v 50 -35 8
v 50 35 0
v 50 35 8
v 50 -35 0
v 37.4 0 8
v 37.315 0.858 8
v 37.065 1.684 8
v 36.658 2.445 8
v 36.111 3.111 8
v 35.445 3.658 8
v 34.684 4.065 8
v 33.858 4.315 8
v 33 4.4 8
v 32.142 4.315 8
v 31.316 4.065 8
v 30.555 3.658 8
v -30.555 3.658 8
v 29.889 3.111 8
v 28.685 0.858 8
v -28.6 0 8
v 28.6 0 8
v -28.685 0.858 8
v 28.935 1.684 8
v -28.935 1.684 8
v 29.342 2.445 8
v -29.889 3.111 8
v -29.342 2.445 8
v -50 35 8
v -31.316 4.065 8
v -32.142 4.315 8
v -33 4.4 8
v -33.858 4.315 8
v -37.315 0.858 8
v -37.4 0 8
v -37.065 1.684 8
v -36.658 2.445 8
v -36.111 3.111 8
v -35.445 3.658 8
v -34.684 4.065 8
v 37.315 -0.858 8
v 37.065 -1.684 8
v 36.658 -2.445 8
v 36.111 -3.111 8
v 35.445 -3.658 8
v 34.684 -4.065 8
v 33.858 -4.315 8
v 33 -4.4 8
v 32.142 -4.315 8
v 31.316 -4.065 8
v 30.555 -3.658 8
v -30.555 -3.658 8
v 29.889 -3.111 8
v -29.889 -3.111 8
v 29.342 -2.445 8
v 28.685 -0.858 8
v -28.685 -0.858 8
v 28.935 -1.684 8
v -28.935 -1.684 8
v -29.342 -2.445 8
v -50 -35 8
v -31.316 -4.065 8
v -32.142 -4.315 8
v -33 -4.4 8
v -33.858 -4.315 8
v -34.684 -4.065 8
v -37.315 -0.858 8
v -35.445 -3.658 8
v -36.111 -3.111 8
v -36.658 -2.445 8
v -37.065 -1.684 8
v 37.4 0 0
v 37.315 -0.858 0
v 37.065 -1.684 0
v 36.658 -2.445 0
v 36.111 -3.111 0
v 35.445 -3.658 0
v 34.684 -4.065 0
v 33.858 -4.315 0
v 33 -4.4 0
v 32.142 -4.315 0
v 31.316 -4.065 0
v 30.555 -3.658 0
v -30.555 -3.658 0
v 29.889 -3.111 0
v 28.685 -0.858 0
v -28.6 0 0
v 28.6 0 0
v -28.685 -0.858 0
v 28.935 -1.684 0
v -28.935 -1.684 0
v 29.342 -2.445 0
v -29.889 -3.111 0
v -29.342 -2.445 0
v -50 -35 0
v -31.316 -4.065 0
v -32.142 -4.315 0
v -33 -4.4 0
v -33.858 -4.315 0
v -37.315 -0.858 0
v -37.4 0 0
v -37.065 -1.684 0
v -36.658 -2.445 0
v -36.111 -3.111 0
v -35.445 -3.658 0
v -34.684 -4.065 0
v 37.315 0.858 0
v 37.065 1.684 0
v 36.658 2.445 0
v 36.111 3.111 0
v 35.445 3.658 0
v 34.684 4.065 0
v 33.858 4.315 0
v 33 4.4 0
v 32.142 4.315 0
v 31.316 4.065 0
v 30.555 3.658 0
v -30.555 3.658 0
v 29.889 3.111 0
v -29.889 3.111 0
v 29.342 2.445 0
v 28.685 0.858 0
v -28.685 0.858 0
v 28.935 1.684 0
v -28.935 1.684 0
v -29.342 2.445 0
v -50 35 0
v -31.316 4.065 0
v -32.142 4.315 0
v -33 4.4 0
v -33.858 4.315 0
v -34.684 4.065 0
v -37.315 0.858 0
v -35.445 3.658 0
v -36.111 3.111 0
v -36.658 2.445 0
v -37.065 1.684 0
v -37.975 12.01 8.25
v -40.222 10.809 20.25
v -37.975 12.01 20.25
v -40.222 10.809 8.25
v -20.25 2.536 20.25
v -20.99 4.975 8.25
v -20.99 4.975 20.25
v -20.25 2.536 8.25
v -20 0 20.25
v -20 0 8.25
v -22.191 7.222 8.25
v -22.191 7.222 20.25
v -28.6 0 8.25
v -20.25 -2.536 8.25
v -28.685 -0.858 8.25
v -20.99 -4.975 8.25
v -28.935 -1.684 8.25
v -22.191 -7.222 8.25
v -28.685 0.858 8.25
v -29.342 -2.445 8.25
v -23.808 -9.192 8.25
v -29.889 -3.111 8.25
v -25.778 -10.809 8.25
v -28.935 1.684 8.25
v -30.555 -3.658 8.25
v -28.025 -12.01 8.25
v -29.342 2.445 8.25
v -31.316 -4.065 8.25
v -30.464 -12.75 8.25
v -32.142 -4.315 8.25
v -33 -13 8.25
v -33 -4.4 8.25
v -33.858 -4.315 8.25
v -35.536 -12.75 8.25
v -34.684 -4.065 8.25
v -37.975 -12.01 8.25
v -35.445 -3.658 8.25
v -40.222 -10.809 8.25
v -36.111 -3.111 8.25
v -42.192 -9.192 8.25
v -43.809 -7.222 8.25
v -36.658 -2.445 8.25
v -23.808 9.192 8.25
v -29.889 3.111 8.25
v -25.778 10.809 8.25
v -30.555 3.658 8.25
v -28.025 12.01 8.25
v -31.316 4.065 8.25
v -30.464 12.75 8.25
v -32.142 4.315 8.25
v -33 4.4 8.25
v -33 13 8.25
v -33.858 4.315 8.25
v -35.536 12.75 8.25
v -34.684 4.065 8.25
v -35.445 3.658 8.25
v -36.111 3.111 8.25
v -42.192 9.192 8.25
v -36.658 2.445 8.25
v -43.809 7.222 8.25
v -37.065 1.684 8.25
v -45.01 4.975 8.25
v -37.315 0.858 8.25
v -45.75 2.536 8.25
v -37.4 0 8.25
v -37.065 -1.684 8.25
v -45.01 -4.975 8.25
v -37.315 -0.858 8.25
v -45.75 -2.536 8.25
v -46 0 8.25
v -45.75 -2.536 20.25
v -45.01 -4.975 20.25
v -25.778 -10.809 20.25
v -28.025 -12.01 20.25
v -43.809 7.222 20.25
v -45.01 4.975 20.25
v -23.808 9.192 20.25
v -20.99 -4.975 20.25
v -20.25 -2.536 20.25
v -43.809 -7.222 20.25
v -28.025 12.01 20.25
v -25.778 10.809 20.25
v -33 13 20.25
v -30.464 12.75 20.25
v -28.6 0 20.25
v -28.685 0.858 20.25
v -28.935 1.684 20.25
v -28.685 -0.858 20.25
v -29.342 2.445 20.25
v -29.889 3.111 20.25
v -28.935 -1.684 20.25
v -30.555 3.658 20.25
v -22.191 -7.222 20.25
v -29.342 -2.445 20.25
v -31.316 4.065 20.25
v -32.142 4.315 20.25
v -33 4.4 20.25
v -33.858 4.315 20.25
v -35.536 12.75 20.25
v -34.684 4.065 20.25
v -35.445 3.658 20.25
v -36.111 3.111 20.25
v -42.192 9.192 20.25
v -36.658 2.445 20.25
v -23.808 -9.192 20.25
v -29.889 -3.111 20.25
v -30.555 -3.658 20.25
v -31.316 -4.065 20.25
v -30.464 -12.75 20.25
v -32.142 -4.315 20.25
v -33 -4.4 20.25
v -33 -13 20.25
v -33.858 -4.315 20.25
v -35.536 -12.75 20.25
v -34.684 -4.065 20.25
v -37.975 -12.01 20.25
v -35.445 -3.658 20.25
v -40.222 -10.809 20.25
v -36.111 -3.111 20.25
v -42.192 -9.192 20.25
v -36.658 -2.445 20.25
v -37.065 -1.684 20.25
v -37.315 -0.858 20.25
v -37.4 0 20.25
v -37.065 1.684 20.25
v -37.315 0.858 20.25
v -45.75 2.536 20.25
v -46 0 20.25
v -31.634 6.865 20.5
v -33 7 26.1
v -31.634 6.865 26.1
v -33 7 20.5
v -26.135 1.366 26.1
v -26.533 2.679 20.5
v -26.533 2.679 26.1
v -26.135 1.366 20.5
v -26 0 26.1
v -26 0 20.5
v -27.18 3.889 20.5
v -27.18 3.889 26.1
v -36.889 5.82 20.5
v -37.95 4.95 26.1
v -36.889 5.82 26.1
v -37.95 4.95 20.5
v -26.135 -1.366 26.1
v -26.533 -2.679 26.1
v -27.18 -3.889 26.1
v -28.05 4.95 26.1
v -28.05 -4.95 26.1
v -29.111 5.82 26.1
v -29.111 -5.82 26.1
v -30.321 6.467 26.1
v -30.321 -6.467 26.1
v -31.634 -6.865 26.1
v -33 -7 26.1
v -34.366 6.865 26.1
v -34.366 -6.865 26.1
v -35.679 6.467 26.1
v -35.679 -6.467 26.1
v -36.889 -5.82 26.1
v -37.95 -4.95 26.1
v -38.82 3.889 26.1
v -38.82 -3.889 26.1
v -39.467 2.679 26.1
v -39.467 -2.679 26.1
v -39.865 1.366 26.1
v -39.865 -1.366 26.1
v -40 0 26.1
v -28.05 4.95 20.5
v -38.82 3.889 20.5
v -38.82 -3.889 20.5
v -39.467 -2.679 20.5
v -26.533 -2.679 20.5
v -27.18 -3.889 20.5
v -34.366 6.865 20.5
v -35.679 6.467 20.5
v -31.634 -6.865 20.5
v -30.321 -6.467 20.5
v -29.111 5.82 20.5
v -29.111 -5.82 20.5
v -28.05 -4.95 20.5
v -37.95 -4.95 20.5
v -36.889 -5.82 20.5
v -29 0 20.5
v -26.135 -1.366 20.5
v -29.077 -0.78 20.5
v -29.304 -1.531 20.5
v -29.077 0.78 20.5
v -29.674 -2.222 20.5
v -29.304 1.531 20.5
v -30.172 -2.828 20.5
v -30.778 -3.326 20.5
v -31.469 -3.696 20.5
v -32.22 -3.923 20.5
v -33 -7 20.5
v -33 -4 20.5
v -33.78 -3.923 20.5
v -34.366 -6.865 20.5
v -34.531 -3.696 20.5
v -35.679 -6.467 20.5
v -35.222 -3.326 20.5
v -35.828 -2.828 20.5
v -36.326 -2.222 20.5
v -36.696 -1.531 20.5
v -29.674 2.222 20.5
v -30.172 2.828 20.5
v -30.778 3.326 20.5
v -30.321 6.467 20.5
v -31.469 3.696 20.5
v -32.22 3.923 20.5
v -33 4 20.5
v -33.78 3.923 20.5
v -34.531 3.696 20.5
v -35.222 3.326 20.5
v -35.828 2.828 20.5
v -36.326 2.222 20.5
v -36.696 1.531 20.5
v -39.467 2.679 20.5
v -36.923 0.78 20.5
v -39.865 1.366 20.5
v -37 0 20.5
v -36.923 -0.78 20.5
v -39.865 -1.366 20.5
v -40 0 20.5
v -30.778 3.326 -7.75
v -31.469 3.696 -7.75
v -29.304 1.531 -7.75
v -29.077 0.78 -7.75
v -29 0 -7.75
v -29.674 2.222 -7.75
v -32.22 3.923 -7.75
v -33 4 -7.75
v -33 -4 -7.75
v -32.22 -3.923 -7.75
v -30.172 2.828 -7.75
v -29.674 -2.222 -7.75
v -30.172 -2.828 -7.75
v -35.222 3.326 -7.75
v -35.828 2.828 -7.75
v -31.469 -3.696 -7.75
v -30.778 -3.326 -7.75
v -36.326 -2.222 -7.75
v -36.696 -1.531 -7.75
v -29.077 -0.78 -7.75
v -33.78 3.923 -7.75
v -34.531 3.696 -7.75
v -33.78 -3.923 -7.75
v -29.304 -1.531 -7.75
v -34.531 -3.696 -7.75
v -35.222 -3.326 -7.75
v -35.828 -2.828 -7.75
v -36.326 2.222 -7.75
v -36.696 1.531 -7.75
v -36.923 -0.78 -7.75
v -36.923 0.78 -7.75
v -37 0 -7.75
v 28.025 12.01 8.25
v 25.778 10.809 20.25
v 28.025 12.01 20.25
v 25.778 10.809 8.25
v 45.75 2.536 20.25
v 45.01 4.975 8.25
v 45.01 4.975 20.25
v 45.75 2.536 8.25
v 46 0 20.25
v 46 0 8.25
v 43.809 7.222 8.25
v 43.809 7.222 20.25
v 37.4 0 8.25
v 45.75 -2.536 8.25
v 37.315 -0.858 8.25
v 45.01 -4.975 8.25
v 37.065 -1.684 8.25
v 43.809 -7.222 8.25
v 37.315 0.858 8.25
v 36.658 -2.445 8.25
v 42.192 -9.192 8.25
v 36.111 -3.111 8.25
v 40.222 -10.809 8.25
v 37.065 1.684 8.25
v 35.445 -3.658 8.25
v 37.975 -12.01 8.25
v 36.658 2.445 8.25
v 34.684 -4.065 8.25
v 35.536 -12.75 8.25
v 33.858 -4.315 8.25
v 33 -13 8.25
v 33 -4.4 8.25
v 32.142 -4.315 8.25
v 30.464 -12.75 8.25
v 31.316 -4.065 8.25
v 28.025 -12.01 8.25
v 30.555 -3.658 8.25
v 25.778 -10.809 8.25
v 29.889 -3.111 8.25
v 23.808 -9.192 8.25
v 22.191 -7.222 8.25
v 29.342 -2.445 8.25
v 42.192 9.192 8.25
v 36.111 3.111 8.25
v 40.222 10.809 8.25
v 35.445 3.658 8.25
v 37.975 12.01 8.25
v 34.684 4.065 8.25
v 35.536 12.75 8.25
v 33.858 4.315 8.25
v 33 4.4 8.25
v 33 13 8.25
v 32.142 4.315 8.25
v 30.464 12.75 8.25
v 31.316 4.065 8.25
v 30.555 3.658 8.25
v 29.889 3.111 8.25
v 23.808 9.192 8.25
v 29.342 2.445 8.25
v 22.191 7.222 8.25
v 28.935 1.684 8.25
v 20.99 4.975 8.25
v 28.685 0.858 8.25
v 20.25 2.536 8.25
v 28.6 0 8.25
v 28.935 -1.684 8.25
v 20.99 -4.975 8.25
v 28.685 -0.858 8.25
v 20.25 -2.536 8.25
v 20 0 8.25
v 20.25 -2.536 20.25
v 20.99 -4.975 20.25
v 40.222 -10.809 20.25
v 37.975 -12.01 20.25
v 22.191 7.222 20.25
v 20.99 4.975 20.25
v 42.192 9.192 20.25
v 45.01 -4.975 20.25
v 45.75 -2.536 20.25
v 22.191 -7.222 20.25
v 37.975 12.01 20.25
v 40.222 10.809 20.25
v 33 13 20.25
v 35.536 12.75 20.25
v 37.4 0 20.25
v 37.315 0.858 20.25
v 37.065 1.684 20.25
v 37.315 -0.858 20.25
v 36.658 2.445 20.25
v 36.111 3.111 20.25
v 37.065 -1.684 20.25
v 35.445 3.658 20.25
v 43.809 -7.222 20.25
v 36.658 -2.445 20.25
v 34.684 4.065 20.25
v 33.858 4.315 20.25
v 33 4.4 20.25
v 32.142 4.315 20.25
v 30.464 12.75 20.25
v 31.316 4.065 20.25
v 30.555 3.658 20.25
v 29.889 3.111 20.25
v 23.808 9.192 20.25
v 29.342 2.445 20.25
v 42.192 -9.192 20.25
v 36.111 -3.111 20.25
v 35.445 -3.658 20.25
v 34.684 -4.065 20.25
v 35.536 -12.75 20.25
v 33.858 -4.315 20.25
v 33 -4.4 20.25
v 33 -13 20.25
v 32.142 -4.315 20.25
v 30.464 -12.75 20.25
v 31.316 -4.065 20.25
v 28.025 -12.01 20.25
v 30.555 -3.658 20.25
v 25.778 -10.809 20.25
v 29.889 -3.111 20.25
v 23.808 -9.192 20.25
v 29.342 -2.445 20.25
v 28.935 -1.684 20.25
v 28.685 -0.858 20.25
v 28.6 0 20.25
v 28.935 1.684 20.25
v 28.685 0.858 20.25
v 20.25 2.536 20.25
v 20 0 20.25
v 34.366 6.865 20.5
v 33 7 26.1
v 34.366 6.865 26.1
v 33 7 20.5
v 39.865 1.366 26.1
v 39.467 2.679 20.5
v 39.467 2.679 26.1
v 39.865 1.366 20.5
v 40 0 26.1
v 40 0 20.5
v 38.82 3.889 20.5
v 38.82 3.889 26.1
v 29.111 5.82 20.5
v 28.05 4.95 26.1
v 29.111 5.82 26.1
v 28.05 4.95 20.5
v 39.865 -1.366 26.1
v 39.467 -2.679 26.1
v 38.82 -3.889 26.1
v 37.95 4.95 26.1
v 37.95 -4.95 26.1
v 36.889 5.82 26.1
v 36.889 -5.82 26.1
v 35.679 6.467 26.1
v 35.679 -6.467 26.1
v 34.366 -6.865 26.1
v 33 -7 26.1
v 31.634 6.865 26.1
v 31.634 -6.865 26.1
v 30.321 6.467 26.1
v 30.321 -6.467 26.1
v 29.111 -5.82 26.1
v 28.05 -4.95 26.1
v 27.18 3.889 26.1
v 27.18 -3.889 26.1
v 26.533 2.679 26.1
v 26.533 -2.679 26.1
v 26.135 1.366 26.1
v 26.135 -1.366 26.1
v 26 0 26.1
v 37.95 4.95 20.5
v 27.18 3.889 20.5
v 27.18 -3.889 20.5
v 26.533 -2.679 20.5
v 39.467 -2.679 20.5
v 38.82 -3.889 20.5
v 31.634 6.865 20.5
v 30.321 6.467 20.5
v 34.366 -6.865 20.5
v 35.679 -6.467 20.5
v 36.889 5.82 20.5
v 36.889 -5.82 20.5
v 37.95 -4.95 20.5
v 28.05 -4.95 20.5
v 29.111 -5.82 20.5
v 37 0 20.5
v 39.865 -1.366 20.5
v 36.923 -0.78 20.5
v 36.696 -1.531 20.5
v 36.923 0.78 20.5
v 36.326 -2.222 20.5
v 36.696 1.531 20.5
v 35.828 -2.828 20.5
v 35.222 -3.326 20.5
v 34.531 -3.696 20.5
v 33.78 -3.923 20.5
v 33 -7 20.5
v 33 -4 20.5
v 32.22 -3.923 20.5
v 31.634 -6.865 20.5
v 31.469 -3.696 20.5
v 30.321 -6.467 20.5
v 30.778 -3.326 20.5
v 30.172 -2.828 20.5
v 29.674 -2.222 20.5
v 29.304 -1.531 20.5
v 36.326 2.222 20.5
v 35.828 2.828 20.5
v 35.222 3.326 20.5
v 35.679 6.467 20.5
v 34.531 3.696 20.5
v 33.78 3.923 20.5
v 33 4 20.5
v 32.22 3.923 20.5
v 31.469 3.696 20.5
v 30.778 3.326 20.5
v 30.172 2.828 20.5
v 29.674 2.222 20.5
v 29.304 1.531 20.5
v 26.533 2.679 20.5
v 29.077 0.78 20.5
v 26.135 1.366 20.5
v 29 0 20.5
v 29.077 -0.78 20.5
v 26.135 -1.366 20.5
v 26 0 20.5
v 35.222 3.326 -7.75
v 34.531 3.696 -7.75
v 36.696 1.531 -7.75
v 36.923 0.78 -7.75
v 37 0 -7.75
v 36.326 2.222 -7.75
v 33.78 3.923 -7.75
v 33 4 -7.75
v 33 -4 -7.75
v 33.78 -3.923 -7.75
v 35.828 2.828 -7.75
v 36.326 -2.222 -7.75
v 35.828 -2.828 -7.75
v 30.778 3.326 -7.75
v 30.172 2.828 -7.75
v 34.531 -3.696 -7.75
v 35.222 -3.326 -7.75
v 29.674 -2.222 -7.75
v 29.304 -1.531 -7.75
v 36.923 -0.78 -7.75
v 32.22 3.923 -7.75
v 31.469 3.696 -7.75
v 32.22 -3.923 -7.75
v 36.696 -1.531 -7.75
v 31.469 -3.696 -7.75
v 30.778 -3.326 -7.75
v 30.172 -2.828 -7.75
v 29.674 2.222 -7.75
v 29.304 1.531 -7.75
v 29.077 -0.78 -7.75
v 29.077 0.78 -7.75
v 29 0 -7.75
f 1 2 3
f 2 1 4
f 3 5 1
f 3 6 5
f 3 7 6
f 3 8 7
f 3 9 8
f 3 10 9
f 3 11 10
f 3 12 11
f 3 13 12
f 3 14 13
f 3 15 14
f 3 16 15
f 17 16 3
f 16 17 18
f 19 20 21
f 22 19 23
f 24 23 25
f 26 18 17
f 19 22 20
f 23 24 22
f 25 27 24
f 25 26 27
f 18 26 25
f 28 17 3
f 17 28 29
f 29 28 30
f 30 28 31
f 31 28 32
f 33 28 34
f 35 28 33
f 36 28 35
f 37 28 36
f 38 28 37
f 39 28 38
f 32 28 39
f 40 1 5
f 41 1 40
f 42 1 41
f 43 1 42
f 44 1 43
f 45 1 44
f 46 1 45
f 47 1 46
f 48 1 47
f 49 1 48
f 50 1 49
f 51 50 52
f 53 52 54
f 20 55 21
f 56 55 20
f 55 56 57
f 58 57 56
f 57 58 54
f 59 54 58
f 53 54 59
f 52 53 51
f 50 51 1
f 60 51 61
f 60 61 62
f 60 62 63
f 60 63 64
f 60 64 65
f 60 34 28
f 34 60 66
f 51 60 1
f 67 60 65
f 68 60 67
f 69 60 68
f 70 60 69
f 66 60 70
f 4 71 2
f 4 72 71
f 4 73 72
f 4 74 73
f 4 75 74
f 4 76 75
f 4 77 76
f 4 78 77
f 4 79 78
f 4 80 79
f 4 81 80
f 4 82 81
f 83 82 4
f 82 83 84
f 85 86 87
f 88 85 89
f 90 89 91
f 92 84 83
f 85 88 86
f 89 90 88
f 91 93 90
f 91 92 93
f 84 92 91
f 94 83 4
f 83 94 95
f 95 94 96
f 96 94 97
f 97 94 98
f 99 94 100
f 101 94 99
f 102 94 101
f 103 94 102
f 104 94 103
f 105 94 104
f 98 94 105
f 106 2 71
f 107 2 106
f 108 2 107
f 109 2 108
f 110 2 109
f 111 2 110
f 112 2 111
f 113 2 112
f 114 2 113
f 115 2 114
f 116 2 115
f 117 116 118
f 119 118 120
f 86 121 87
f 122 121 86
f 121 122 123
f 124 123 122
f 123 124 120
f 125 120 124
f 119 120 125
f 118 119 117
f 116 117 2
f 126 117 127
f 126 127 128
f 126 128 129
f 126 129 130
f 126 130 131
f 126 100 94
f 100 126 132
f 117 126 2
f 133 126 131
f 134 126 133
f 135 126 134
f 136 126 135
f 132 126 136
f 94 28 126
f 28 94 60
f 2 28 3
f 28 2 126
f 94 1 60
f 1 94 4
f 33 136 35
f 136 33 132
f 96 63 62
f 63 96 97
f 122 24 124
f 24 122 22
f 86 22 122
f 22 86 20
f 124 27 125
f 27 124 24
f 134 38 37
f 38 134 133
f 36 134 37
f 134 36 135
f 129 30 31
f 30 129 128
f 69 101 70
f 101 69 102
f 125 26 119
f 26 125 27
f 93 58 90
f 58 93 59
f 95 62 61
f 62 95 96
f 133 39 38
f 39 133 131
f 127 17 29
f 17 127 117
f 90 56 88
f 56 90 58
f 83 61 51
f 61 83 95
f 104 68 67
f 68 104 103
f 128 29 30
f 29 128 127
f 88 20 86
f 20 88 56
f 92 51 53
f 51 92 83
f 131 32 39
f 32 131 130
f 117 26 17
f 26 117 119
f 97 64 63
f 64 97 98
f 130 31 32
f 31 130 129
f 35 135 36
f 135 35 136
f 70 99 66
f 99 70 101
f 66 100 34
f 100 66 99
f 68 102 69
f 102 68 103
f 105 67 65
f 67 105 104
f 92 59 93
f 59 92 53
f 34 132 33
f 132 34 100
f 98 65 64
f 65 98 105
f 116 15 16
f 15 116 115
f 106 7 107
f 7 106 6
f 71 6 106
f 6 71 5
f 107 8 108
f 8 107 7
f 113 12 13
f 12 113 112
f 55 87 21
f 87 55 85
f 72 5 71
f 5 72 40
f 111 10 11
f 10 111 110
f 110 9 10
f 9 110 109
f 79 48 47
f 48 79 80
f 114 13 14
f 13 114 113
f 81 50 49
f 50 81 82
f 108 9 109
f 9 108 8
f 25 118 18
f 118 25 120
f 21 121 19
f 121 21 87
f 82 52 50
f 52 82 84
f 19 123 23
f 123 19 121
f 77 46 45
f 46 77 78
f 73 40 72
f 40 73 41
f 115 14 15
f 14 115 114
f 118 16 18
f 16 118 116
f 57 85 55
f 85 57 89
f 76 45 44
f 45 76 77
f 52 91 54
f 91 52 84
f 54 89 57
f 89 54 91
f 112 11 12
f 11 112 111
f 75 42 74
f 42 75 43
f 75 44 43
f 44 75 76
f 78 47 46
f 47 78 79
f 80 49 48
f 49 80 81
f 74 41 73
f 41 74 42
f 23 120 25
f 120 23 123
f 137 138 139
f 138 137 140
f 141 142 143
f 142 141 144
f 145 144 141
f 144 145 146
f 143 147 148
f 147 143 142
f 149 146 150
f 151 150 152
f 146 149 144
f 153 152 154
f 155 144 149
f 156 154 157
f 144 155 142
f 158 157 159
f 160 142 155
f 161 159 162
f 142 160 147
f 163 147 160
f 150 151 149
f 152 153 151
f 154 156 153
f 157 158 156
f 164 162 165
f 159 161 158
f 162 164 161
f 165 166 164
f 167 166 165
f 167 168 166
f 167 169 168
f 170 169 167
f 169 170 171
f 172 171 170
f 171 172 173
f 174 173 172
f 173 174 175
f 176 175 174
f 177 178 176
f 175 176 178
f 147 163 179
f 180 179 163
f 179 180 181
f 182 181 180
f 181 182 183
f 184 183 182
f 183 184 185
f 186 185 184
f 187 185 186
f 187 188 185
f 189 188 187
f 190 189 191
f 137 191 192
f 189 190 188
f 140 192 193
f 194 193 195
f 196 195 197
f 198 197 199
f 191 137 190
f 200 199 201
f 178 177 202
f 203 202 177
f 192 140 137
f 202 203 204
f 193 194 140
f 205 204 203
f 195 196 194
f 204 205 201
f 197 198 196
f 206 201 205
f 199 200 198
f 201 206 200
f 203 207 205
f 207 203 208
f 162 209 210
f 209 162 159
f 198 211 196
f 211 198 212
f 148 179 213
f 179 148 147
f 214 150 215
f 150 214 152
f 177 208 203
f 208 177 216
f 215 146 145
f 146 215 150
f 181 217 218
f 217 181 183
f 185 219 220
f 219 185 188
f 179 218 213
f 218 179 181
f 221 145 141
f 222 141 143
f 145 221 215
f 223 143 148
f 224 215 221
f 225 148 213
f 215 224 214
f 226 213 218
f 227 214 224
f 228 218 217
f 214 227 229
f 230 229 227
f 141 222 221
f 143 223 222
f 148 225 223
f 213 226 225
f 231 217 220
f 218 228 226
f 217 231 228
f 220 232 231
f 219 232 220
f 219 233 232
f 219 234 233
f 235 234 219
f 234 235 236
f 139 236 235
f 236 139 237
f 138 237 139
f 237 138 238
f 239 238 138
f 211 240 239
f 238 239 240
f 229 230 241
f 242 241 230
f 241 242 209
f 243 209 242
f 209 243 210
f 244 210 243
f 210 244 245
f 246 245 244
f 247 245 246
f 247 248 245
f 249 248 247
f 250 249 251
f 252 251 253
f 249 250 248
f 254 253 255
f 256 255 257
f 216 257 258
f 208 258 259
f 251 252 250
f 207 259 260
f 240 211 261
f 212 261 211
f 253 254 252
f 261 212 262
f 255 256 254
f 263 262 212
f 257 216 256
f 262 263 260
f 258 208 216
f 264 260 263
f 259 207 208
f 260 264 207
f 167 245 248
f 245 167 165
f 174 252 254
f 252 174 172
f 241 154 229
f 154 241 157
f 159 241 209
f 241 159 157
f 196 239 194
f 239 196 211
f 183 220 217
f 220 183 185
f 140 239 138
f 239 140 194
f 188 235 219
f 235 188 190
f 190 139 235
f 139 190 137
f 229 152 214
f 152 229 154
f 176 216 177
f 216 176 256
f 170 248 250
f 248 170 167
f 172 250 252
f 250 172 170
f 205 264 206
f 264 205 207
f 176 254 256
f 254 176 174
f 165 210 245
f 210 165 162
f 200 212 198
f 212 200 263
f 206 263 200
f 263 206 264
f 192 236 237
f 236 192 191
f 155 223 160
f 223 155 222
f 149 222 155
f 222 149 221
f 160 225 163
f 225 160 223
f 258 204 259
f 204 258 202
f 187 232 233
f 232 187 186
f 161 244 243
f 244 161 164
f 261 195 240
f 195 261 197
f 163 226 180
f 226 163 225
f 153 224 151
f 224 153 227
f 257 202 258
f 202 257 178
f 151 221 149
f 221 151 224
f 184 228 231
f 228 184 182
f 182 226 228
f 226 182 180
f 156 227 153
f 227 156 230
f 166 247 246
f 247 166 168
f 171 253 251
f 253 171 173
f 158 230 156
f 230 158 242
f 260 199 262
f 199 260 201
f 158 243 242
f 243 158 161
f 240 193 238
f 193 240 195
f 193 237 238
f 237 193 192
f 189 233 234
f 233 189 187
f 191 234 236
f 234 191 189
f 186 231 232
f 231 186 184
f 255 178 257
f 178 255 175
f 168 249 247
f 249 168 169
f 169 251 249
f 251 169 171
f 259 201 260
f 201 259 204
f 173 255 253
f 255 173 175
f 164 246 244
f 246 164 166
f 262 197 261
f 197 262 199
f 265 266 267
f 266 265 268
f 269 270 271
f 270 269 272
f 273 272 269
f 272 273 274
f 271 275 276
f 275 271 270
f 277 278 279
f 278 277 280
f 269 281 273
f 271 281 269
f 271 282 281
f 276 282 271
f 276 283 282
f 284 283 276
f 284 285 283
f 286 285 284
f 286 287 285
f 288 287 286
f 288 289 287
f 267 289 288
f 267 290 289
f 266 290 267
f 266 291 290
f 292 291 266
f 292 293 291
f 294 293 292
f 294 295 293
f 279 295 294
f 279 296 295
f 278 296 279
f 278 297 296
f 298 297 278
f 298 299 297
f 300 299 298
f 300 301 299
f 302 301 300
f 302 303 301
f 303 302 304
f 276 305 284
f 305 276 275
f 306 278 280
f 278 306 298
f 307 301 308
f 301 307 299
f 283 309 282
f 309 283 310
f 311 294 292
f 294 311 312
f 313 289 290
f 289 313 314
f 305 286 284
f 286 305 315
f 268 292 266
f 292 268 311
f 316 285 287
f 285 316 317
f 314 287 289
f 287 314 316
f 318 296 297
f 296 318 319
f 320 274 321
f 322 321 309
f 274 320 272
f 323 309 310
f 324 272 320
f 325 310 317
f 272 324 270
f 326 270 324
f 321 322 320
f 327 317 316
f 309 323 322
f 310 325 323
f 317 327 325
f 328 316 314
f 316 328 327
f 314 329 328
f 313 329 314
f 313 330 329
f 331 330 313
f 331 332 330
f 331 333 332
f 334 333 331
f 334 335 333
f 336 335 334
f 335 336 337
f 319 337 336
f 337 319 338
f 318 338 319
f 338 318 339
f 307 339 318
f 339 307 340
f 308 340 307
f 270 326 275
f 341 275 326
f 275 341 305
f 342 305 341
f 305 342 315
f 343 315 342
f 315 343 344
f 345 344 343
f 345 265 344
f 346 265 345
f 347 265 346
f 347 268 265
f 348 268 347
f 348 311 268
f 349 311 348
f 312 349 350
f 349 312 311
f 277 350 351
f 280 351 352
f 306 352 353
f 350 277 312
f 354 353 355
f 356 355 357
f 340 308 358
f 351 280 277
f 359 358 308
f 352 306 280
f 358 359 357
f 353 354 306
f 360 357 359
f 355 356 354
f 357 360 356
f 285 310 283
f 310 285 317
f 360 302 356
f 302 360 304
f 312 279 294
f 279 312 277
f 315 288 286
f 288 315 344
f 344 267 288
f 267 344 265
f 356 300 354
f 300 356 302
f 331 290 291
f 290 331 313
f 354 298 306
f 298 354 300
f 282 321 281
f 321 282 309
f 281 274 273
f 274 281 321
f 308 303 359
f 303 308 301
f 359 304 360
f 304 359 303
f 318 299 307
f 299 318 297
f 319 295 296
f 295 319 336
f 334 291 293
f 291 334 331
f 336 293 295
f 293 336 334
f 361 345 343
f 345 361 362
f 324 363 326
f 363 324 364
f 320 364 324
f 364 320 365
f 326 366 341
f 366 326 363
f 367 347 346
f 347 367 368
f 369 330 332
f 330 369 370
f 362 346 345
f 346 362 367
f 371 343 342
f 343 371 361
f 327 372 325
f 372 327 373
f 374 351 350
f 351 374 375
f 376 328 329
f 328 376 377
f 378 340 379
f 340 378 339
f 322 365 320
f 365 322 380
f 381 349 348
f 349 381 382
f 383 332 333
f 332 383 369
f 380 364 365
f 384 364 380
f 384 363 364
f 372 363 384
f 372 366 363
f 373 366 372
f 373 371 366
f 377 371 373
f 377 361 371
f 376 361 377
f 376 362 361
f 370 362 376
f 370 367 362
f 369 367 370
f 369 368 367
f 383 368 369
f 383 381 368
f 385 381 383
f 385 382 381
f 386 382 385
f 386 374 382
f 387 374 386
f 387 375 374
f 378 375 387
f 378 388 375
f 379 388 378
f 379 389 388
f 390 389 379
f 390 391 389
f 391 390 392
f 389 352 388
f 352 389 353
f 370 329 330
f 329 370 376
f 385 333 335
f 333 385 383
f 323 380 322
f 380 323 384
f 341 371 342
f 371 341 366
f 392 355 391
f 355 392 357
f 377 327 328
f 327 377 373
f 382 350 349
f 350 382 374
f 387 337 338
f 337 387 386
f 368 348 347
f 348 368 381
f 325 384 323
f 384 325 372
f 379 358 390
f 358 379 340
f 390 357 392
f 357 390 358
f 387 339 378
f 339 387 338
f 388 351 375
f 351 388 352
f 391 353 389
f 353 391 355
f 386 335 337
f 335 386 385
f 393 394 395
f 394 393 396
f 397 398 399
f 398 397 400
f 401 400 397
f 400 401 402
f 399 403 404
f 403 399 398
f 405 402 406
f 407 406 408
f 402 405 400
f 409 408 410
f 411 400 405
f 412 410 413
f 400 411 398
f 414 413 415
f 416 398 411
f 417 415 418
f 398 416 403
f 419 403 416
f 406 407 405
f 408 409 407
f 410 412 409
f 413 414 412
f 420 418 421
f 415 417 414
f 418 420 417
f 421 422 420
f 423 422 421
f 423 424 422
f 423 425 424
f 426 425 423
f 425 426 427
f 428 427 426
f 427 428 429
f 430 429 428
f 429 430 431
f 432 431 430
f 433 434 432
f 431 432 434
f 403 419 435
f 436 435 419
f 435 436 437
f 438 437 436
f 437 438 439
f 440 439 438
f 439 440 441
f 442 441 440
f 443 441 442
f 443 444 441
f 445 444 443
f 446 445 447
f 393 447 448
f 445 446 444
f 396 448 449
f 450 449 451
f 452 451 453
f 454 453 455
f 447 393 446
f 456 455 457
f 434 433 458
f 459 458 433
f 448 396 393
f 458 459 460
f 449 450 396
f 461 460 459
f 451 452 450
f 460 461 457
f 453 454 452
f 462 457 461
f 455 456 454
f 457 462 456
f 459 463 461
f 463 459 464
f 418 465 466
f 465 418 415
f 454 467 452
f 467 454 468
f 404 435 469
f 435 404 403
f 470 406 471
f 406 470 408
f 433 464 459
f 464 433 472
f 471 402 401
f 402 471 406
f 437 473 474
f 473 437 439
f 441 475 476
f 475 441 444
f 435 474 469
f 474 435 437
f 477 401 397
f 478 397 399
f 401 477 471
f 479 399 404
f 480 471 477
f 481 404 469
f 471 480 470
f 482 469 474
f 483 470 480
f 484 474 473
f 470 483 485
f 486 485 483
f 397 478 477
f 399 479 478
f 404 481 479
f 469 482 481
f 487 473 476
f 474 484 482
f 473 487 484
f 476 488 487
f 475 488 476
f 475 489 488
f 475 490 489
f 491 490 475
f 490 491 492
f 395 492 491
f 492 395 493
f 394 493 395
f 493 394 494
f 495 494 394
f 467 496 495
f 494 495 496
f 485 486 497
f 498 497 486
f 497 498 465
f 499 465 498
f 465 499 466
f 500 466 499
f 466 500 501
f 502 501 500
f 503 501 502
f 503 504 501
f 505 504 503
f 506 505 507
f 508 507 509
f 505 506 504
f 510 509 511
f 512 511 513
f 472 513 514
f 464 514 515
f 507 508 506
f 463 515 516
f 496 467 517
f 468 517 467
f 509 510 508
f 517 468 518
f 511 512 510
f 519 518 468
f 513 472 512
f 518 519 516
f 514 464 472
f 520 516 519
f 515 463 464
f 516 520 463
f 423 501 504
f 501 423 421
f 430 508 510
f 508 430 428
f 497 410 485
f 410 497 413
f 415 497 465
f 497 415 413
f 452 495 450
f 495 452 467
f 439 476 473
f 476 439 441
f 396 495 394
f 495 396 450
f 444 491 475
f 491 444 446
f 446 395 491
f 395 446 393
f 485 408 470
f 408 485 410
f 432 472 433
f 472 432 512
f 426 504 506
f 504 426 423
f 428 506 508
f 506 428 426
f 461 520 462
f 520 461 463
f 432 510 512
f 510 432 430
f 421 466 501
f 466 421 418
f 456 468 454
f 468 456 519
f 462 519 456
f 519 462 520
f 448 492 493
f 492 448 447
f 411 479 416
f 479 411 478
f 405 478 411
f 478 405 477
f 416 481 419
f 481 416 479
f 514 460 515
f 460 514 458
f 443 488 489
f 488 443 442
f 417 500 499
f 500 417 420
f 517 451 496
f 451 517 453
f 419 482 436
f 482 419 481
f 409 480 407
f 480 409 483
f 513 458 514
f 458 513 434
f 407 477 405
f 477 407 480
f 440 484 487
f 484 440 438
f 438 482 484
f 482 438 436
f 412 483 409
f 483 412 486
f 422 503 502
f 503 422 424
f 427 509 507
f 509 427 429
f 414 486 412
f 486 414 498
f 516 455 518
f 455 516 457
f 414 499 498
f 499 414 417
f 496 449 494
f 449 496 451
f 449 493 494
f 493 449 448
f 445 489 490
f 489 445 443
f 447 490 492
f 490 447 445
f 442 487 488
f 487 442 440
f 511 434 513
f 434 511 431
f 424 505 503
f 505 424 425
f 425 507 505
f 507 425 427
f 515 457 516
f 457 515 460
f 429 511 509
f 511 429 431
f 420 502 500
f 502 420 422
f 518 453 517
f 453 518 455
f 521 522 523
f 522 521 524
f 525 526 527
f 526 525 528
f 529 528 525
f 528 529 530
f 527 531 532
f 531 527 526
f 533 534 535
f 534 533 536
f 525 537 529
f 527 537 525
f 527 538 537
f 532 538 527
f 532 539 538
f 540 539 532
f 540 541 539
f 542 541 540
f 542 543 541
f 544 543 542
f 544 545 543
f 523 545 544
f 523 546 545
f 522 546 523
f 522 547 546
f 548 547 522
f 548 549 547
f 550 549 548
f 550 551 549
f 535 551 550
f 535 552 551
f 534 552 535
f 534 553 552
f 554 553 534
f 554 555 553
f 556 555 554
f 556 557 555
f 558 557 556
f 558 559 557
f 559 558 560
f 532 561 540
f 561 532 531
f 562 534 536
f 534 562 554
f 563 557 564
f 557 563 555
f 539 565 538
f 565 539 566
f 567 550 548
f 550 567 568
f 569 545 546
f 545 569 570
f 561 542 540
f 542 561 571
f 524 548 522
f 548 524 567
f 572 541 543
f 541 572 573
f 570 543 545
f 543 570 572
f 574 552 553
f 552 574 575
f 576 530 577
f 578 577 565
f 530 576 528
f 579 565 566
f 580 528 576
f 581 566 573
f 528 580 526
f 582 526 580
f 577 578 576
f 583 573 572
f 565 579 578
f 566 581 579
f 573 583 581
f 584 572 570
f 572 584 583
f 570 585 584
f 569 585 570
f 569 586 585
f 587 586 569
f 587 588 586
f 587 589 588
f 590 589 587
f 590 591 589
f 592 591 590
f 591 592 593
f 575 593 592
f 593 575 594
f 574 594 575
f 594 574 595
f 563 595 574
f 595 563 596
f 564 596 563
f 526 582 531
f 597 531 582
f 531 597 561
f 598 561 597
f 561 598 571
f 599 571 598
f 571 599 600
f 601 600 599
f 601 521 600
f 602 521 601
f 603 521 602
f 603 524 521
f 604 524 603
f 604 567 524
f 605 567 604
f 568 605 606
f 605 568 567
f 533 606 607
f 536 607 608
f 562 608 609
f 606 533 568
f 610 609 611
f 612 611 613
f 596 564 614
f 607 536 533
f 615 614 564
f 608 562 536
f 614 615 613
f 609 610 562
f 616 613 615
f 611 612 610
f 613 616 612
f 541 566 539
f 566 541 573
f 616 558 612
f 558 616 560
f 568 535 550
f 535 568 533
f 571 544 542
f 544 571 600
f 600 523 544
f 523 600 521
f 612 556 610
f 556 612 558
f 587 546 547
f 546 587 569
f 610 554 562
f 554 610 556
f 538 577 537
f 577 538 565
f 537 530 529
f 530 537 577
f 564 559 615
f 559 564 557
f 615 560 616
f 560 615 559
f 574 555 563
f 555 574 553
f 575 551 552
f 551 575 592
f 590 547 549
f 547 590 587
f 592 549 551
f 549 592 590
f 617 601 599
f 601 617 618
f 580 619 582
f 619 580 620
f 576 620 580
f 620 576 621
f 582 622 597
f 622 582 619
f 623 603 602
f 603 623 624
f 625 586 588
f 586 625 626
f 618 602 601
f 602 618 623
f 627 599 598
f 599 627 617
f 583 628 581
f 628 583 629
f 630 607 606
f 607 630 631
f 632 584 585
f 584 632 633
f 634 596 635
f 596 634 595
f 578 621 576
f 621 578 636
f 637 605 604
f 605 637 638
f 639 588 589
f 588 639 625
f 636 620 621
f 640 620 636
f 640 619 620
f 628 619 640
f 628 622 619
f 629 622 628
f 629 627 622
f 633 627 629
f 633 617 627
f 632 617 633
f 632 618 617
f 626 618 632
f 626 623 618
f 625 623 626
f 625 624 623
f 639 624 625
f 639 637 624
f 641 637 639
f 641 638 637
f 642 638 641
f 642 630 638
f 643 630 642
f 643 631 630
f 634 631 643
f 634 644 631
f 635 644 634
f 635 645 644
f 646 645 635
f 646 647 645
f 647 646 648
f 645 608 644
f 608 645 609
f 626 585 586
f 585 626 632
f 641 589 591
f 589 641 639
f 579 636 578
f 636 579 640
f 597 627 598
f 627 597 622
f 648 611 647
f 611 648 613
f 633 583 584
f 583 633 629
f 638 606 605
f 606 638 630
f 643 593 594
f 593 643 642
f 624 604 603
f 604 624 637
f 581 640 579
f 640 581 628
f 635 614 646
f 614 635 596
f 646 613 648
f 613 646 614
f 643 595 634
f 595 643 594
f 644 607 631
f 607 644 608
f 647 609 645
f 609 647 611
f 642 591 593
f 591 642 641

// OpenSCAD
$fn = 32;

// ------------------------------------------------------------------------
// Standoff columns: 2 d26 standoffs, bolts d8
// Every part is its own module, assembly() places them once.
// ------------------------------------------------------------------------

// --- part 1 ---
module base_plate() {
  difference() {
    translate([-50, -35, 0]) cube([100, 70, 8]);
    translate([-33, 0, -1]) cylinder(h = 10, d = 8.8);
    translate([33, 0, -1]) cylinder(h = 10, d = 8.8);
  }
}

// --- part 2 ---
module spacer1() {
  difference() {
      translate([0, 0, 0]) cylinder(h = 12, d = 26);
      translate([0, 0, -1]) cylinder(h = 14, d = 8.8);
    }
}

// --- part 3 ---
module bolt1() {
  cylinder(h = 5.6, d = 14);
  translate([0, 0, -28.25]) cylinder(h = 28.25, d = 8);
}

// --- part 4 ---
module spacer2() {
  difference() {
      translate([0, 0, 0]) cylinder(h = 12, d = 26);
      translate([0, 0, -1]) cylinder(h = 14, d = 8.8);
    }
}

// --- part 5 ---
module bolt2() {
  cylinder(h = 5.6, d = 14);
  translate([0, 0, -28.25]) cylinder(h = 28.25, d = 8);
}

// --- assembly ---
module assembly() {
  translate([0, 0, 0]) rotate([0, 0, 0]) base_plate();
  translate([-33, 0, 8.25]) rotate([0, 0, 0]) spacer1();
  translate([-33, 0, 20.5]) rotate([0, 0, 0]) bolt1();
  translate([33, 0, 8.25]) rotate([0, 0, 0]) spacer2();
  translate([33, 0, 20.5]) rotate([0, 0, 0]) bolt2();
}

assembly();
